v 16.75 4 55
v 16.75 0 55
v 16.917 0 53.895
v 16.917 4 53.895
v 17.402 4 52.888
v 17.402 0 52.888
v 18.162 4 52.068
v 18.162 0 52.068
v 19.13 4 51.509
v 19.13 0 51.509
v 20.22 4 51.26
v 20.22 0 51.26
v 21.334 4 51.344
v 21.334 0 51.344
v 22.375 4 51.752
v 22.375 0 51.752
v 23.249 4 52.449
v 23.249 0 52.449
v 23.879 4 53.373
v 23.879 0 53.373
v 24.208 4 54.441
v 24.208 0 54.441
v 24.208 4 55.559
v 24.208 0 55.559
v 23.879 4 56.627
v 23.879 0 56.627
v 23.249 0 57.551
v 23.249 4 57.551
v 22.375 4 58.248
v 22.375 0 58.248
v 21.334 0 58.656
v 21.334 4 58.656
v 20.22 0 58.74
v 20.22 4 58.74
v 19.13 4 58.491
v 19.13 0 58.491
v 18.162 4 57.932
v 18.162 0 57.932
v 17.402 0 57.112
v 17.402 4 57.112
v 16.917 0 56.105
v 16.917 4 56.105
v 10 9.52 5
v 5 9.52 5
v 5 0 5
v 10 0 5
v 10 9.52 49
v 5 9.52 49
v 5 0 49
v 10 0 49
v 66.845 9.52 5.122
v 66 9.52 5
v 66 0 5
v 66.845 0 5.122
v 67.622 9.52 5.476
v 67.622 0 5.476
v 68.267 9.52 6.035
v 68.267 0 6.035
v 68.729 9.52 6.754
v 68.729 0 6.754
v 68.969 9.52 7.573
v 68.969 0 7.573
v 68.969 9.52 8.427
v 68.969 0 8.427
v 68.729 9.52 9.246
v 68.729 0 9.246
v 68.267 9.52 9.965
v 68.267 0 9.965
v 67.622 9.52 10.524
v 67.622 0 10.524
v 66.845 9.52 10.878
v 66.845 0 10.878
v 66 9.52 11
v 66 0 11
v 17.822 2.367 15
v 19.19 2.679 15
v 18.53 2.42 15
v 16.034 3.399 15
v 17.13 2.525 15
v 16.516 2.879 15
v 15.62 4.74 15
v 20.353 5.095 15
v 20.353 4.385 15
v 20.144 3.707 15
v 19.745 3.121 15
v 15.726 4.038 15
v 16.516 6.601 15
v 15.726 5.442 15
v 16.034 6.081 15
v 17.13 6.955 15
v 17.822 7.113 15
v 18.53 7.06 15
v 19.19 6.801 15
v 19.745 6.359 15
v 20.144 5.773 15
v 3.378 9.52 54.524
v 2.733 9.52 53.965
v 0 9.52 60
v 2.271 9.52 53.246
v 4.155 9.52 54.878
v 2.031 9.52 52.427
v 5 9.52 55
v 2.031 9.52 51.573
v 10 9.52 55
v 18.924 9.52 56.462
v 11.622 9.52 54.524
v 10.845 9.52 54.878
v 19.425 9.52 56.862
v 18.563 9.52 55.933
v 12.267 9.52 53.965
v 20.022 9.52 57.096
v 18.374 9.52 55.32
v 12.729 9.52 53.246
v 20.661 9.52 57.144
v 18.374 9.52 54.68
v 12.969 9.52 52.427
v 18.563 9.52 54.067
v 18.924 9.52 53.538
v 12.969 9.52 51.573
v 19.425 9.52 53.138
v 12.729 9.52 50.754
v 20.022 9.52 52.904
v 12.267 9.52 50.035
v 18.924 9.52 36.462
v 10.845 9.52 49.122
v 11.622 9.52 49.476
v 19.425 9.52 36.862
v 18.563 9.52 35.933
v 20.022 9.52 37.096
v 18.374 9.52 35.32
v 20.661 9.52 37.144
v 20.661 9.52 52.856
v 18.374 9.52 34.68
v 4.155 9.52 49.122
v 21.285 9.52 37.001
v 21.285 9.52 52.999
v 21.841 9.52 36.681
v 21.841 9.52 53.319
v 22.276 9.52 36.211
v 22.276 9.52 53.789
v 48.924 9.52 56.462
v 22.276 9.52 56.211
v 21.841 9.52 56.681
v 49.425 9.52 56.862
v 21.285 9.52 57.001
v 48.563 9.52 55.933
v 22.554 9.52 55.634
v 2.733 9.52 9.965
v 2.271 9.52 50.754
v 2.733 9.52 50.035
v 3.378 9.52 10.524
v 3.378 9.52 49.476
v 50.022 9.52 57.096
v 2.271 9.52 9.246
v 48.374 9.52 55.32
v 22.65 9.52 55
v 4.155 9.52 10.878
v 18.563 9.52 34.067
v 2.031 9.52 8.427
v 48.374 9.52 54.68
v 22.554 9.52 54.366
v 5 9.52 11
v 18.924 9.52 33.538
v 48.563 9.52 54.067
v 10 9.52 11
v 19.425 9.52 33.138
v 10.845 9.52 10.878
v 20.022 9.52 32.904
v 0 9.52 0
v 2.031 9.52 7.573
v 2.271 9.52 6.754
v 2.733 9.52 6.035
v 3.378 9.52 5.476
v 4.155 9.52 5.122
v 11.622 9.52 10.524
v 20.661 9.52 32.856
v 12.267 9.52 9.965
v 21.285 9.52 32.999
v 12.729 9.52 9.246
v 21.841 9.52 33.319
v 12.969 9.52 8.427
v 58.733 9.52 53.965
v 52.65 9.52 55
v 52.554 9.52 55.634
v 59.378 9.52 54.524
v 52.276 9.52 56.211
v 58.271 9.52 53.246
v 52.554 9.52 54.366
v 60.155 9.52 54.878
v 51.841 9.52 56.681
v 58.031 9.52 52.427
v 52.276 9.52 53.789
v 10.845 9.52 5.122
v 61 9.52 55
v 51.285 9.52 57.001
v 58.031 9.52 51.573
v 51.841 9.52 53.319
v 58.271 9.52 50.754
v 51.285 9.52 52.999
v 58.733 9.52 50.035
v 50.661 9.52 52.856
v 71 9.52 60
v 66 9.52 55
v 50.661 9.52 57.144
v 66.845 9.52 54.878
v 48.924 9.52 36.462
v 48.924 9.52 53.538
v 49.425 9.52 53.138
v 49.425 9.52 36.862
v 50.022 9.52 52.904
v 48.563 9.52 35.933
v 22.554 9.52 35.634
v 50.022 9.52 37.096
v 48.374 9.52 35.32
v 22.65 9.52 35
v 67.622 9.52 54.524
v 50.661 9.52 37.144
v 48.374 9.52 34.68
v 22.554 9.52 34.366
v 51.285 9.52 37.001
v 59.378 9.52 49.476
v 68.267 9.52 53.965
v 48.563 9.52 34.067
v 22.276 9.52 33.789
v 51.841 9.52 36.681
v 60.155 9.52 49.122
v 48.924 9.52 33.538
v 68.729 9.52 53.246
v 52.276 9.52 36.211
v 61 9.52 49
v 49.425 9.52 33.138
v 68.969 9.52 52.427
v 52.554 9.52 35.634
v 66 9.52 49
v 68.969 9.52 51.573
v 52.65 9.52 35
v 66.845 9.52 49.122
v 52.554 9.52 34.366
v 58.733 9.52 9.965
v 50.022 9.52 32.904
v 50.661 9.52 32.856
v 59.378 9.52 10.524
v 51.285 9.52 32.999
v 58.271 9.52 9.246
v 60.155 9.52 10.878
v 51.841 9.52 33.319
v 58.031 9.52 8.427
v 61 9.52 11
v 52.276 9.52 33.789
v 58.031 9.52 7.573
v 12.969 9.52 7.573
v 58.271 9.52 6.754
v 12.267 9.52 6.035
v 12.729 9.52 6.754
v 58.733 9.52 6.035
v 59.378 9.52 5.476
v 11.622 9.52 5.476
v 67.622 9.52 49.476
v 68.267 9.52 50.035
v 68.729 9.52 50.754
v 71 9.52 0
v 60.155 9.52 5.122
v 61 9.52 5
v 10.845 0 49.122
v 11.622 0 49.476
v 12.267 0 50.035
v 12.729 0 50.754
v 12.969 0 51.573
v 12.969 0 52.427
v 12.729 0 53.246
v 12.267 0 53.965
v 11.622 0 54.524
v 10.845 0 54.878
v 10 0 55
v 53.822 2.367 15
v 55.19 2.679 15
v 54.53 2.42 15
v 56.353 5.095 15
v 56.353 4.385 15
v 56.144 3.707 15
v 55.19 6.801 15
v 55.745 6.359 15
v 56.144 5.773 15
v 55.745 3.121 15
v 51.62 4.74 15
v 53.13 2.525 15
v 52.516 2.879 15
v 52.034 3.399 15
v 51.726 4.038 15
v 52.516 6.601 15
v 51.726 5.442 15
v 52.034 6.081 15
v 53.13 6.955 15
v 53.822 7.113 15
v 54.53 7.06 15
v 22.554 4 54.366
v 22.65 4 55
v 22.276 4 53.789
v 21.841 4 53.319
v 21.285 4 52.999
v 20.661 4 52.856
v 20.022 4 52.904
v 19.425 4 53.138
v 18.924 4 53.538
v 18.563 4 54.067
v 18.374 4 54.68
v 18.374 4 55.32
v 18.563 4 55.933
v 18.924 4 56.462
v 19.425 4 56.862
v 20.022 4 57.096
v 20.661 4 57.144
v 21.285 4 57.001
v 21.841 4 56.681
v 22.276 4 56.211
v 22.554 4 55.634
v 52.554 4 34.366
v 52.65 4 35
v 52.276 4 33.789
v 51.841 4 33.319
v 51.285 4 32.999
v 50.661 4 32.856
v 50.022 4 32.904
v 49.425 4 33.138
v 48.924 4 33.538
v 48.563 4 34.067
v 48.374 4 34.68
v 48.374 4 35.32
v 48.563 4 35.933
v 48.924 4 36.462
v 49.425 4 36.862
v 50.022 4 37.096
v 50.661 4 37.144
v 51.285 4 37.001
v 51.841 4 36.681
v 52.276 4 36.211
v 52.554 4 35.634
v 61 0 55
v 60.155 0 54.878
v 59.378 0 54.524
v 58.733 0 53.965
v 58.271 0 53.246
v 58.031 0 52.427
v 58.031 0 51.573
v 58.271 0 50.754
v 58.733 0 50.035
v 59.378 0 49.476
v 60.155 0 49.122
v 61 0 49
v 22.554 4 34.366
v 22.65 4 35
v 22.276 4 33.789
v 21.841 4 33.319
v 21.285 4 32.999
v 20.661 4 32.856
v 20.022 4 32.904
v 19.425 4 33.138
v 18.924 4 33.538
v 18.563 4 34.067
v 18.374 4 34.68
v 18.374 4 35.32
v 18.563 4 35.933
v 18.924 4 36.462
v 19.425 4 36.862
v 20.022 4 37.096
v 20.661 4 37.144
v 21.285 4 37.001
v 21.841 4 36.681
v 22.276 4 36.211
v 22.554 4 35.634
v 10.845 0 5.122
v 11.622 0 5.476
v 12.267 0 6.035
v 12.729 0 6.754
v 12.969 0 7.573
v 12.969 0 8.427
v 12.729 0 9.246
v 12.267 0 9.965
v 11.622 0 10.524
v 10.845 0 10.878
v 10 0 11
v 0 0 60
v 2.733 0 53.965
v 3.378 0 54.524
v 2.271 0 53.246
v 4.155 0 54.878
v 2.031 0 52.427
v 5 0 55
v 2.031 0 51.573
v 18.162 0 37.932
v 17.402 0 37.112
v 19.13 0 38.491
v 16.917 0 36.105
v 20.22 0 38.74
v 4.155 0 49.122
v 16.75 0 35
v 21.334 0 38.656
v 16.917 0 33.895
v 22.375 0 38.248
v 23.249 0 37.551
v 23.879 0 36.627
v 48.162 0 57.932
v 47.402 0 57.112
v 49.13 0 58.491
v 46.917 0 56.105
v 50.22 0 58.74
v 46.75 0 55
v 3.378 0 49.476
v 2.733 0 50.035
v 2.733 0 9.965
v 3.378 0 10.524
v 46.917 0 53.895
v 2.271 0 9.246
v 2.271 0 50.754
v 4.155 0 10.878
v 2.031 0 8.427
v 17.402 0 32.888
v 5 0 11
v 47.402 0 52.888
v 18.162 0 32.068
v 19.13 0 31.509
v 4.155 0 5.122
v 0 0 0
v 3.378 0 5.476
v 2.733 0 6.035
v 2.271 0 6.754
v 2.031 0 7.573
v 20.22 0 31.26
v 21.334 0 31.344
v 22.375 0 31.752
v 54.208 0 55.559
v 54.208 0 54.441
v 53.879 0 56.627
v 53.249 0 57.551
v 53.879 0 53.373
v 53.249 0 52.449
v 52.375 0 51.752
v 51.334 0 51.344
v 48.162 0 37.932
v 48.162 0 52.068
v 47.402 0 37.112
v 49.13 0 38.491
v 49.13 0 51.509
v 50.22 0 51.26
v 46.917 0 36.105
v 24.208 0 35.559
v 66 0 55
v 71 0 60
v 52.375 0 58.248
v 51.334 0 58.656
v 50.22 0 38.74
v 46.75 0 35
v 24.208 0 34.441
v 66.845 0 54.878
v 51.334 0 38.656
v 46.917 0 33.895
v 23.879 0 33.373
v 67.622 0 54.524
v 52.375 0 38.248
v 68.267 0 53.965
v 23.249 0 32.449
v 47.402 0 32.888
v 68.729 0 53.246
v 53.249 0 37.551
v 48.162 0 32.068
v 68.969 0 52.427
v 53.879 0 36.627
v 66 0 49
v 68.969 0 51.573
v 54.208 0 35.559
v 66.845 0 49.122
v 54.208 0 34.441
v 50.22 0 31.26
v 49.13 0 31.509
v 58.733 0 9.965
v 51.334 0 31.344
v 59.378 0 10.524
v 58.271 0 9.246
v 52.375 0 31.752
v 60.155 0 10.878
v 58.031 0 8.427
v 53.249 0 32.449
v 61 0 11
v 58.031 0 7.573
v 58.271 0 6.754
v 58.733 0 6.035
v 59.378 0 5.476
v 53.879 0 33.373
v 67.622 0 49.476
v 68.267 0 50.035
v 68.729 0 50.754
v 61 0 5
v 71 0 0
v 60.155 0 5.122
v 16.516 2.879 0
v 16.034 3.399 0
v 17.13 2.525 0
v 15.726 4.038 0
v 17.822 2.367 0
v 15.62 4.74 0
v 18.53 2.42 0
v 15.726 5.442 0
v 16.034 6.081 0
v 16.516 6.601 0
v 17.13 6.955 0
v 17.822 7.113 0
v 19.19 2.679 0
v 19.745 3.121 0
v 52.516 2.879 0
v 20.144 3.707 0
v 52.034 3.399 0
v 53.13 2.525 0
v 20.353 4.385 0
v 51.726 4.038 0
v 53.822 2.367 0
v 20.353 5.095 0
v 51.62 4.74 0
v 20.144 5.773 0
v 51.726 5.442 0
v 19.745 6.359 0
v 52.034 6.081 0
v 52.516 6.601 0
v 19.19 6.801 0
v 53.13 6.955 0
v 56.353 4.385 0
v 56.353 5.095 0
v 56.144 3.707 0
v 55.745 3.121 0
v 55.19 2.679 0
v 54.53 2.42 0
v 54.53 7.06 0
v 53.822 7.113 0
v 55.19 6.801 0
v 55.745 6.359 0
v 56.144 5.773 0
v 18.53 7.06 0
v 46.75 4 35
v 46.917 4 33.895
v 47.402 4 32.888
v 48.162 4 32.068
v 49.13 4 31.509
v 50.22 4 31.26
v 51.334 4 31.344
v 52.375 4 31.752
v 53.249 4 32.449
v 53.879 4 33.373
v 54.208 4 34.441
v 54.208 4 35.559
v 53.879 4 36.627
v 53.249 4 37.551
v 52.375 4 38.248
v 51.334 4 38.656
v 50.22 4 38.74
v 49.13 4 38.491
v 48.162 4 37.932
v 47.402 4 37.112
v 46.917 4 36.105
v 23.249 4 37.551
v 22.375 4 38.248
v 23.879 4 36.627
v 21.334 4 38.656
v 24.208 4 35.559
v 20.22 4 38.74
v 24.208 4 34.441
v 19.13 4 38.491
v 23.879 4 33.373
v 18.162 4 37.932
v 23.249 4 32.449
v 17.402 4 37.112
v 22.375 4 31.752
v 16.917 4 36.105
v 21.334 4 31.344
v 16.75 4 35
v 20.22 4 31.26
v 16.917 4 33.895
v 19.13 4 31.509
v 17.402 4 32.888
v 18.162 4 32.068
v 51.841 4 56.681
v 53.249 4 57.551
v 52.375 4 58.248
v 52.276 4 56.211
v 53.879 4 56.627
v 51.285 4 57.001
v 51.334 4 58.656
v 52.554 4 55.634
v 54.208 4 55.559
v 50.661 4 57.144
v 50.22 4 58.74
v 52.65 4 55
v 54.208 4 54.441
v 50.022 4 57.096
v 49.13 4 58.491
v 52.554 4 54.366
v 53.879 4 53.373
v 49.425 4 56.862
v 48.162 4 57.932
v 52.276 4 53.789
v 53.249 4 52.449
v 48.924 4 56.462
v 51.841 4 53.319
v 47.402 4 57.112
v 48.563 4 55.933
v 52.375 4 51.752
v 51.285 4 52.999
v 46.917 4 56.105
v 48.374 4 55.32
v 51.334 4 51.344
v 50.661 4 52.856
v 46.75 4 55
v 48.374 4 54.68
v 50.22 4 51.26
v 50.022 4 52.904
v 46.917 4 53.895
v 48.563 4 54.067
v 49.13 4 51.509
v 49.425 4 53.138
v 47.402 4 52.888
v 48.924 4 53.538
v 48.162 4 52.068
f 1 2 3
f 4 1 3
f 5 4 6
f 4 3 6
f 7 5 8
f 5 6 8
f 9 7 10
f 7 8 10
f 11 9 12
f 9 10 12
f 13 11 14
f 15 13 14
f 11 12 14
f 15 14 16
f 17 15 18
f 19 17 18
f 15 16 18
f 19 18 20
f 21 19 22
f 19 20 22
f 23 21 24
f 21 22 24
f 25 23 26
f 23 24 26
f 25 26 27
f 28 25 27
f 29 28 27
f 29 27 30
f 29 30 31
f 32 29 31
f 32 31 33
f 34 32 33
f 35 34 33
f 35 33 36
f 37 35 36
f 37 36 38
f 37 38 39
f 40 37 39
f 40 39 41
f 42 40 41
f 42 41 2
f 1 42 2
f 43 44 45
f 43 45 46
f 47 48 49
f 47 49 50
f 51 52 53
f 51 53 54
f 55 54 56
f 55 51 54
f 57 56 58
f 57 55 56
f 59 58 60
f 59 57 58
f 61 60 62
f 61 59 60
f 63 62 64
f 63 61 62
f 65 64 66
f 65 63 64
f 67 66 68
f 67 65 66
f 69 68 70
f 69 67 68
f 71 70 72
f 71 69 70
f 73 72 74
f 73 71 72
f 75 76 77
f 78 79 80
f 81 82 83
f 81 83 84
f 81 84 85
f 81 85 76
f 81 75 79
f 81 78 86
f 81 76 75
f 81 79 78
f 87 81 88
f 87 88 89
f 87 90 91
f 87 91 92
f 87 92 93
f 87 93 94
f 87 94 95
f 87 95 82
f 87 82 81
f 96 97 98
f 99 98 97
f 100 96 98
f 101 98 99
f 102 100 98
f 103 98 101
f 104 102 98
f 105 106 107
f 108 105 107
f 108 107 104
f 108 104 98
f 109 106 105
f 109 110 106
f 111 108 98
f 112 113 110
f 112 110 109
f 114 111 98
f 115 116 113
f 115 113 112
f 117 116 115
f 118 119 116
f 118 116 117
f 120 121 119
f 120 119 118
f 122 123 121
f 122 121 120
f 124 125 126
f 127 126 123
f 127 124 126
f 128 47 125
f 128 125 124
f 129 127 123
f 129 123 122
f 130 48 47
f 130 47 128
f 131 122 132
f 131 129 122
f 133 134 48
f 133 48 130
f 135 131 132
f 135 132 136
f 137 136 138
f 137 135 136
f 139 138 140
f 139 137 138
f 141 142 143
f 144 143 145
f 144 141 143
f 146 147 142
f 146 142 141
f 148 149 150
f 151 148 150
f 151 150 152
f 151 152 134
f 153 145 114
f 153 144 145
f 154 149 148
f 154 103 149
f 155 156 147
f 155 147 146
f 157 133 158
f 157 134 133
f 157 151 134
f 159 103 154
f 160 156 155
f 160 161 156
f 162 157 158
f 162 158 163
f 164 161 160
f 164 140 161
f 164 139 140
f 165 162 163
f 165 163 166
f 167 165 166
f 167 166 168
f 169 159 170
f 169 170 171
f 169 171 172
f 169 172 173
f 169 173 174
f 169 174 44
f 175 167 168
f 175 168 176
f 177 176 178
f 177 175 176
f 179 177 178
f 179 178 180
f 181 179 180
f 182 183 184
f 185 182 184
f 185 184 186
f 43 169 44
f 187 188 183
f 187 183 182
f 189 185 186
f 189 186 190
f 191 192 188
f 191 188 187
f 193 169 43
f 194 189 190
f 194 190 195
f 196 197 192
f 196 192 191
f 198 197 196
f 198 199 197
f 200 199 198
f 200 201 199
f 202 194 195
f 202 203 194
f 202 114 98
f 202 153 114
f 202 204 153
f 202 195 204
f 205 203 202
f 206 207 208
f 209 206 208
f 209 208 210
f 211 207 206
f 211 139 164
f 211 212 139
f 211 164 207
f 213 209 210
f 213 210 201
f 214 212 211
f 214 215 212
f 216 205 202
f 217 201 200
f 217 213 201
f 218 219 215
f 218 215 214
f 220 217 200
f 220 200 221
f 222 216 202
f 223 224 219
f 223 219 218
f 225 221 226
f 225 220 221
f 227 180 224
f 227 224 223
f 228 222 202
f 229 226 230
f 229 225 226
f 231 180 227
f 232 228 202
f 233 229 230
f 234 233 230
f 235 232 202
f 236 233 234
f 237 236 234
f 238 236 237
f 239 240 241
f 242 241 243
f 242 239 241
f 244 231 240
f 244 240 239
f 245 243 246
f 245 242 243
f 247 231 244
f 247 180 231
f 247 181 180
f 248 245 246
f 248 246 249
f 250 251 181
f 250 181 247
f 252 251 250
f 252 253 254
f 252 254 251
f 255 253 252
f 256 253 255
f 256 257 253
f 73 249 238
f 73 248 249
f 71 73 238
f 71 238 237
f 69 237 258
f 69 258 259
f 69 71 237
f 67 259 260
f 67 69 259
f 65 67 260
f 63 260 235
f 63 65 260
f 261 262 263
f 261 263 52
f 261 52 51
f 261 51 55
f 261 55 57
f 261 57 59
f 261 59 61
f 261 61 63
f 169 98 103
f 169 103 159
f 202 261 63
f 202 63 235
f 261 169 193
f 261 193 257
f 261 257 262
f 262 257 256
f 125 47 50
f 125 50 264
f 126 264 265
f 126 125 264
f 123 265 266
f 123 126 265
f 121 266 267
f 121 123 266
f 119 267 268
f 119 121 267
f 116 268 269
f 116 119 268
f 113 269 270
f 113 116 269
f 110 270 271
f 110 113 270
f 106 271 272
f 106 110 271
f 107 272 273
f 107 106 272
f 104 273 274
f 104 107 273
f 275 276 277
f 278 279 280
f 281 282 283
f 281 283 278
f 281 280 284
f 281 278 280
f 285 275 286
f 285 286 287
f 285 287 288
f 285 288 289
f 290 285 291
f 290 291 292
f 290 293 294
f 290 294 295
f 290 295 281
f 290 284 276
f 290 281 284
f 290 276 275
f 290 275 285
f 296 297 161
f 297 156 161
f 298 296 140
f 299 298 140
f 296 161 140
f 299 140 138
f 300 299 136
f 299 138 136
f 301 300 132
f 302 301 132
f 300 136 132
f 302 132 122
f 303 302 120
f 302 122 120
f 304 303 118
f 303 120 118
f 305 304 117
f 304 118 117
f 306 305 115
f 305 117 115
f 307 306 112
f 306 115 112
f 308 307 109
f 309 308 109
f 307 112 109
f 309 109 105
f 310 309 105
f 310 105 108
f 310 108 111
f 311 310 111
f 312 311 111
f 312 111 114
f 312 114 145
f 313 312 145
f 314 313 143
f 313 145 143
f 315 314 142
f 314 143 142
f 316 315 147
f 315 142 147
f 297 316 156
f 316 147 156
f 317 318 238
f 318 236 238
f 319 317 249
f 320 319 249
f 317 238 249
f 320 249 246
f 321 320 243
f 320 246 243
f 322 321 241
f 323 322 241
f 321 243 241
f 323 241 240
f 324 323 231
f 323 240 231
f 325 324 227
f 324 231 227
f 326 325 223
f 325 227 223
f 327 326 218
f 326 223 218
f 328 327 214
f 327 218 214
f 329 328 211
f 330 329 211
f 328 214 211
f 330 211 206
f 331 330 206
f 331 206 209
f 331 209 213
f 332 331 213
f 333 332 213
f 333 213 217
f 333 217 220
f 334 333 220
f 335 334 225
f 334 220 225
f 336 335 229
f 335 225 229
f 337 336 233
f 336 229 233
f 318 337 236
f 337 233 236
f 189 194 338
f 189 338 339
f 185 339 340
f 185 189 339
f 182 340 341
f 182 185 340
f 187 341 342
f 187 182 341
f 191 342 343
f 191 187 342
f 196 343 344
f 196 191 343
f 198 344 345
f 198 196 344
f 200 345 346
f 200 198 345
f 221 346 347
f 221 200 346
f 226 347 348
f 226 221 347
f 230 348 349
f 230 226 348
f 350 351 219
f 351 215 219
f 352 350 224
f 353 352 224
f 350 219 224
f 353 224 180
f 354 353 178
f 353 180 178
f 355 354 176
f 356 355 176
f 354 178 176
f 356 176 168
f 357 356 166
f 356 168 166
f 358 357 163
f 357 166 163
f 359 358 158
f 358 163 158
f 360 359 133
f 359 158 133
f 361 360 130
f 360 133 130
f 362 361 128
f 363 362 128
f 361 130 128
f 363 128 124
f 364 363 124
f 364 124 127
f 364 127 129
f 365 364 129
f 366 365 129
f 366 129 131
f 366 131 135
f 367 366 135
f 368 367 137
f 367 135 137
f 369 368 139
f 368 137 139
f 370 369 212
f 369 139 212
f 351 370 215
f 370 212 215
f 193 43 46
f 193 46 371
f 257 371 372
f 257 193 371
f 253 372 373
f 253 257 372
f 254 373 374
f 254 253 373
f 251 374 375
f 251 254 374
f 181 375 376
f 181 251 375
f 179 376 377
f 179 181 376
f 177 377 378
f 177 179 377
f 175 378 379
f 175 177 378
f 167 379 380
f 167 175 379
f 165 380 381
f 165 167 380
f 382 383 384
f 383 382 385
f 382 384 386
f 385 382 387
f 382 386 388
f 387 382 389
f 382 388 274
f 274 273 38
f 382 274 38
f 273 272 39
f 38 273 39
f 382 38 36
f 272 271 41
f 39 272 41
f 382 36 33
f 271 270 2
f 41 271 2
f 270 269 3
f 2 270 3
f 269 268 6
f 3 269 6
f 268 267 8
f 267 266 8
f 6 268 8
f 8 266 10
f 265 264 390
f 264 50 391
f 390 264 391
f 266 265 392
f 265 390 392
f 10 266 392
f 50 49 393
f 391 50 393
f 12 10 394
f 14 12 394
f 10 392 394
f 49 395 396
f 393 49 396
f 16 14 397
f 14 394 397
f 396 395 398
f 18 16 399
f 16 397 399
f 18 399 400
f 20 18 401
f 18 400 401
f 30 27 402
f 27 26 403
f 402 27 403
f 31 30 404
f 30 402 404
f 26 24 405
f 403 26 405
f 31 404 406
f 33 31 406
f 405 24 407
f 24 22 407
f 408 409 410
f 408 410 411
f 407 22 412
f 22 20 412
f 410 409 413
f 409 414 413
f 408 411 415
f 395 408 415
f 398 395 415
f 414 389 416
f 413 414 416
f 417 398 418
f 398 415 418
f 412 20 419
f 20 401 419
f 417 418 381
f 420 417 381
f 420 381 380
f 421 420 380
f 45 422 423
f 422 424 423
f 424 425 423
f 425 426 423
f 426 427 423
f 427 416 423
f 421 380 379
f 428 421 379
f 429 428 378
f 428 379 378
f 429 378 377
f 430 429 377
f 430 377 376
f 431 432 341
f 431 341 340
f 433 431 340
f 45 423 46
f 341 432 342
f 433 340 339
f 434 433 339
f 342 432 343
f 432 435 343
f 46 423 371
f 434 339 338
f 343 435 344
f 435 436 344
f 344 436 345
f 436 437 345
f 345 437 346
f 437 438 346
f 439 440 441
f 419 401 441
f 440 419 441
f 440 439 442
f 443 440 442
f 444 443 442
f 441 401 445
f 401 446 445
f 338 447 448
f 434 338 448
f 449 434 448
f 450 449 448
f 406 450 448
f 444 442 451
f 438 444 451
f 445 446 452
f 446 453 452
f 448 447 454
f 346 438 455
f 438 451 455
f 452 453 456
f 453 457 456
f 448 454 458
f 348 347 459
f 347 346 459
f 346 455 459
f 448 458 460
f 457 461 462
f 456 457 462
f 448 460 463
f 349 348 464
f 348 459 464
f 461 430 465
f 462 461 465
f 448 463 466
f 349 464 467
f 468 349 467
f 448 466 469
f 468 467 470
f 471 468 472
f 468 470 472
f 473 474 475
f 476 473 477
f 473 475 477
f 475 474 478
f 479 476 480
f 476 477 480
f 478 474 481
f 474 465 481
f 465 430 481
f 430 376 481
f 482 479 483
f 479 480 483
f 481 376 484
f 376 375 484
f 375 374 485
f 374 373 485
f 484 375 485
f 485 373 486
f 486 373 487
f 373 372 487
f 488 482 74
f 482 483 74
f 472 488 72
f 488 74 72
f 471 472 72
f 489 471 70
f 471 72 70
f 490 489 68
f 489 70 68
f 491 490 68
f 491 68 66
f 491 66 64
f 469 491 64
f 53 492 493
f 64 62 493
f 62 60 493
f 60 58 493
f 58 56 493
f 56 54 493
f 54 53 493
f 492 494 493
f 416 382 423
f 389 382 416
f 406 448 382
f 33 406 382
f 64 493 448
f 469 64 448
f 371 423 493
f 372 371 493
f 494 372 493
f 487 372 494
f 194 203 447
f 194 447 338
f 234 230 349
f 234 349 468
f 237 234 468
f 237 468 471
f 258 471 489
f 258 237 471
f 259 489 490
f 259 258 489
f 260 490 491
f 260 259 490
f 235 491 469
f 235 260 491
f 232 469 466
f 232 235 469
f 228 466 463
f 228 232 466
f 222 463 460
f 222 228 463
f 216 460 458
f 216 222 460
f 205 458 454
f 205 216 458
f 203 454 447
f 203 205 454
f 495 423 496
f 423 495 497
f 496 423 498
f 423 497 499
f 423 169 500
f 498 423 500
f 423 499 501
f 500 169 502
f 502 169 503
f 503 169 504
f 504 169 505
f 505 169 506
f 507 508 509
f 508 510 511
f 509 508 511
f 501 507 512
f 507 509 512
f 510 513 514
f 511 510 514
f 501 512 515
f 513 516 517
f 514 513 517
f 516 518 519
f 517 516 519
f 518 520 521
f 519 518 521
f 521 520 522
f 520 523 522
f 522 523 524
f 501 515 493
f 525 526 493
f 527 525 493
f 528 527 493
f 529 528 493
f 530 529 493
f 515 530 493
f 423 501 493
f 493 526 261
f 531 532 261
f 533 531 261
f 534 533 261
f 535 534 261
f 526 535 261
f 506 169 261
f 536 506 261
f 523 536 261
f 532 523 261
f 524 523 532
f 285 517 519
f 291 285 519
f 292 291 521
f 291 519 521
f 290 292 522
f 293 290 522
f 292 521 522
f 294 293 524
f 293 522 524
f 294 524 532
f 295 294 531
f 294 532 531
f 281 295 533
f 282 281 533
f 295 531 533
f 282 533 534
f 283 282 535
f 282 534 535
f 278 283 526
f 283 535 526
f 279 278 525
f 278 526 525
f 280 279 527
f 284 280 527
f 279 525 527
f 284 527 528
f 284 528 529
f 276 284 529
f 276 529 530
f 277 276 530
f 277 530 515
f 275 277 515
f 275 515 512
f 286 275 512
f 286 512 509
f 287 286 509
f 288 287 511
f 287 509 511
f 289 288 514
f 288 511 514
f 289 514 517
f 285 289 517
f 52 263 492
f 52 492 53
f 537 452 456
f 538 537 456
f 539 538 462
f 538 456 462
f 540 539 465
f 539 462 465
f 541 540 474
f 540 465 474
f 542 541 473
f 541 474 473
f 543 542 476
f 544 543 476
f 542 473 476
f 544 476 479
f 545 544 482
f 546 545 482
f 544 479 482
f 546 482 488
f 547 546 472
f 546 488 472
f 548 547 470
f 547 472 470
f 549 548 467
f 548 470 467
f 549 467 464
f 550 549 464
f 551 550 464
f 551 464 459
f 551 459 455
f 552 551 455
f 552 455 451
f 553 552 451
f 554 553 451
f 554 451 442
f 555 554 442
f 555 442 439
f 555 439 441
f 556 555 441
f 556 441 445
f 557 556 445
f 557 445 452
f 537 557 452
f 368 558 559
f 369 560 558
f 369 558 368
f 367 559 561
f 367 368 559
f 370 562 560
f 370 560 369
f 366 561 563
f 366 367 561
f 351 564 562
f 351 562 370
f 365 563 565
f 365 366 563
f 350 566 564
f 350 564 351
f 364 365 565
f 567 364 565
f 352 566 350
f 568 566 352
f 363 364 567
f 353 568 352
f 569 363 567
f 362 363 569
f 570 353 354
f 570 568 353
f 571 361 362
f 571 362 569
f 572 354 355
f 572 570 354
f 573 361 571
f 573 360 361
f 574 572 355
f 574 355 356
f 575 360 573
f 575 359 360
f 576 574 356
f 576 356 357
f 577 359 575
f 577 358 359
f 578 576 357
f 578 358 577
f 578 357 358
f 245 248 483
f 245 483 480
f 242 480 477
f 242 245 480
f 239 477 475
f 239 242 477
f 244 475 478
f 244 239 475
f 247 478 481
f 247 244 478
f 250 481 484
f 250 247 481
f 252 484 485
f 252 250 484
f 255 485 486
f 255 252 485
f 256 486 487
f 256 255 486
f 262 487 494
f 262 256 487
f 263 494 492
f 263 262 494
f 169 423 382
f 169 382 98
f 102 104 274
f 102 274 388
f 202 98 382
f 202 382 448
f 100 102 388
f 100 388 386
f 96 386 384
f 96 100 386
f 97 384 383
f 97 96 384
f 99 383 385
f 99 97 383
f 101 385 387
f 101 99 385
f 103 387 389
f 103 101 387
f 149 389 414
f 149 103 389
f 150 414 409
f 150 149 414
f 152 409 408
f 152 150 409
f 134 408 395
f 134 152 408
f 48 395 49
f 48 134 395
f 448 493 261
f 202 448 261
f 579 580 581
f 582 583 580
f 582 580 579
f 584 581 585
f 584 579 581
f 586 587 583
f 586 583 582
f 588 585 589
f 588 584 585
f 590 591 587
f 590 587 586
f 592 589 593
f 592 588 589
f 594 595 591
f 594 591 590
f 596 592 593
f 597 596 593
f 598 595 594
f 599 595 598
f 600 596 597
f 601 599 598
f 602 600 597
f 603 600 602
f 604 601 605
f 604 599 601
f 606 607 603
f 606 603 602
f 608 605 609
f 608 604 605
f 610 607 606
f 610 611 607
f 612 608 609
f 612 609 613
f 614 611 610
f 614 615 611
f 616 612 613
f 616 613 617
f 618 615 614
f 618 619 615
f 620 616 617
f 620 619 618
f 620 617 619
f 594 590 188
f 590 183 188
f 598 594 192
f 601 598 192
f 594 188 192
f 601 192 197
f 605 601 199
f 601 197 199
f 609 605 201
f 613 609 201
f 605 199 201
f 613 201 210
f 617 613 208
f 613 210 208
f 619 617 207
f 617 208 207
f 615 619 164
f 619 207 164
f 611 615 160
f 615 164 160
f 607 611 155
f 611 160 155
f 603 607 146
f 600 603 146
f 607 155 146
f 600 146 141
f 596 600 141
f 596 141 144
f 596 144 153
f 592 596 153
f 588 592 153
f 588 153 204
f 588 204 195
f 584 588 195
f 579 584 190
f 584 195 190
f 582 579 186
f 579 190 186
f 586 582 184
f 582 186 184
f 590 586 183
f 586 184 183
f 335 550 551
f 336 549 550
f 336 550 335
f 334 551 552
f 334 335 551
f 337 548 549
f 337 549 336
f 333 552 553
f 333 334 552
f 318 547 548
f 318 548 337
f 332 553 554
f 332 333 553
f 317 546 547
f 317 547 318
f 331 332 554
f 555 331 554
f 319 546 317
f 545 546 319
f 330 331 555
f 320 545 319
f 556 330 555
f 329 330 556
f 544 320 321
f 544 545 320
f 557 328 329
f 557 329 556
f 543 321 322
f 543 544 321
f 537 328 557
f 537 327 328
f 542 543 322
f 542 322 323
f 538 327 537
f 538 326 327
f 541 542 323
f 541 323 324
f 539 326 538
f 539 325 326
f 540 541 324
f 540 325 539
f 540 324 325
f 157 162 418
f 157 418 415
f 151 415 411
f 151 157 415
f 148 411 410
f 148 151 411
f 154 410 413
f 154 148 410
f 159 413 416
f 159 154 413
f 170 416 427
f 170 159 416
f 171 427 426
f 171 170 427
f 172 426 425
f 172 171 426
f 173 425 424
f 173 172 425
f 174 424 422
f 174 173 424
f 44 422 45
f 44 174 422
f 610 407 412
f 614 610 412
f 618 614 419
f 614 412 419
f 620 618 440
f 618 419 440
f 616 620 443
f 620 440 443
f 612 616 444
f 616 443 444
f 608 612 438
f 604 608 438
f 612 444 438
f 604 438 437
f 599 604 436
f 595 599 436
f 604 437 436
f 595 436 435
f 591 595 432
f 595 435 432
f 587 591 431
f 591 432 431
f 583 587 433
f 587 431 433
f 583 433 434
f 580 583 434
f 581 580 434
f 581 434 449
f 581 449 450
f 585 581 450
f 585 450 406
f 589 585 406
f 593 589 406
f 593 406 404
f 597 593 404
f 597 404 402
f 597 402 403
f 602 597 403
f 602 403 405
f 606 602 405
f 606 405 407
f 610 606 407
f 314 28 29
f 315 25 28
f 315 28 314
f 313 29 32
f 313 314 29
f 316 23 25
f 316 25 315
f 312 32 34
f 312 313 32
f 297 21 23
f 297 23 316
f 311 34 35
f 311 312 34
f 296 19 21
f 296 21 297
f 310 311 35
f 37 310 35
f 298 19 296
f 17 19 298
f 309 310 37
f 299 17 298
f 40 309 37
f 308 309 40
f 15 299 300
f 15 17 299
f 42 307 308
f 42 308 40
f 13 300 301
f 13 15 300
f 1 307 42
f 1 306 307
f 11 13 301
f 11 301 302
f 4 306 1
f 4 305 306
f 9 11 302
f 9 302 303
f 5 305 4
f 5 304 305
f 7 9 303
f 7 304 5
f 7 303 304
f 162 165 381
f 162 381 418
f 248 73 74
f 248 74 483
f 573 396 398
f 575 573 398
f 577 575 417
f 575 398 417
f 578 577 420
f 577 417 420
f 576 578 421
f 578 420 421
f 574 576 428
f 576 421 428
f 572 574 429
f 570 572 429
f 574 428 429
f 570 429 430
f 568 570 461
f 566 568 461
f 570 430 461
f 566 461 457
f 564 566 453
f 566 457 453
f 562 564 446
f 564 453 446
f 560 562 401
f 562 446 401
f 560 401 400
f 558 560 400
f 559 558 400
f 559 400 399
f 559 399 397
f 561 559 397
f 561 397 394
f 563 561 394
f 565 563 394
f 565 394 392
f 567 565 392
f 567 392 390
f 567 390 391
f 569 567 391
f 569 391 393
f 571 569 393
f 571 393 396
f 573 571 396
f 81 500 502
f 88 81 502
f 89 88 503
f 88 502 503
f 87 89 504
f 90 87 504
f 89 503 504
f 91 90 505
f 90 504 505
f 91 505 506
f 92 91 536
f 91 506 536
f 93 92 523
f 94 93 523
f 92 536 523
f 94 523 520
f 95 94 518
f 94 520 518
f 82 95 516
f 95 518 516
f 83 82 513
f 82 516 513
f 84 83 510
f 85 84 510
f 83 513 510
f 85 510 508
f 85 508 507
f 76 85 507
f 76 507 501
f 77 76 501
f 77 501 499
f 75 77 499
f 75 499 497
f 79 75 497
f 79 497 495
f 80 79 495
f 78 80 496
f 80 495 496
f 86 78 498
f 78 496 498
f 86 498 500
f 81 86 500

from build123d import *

# Parameters (mm, degrees)
CROQUIS2_W                                           = 71
CROQUIS2_H                                           = 9.52
SALIENTE_EXTRUIR1_DEPTH                              = 60
CROQUIS3_R                                           = 2.38
CORTAR_EXTRUIR1_DEPTH                                = 15
CORTAR_EXTRUIR2_REACH                                = 95.443
REFRENTADO_PARA_TORNILLO_TAP_N_CON_CABEZ_D           = 4.3
REFRENTADO_PARA_TORNILLO_TAP_N_CON_CABEZ_DEPTH       = 17
REFRENTADO_PARA_TORNILLO_TAP_N_CON_CABEZ_CBORE_D     = 7.5
REFRENTADO_PARA_TORNILLO_TAP_N_CON_CABEZ_CBORE_DEPTH = 4
REFRENTADO_PARA_TORNILLO_TAP_N_CON_CABEZ_TIP         = 1.291850331


with BuildPart() as part:
    # Croquis2 → Saliente-Extruir1 (new body)
    with BuildSketch(Plane.XY):
        with Locations((35.5, 4.76)):
            Rectangle(CROQUIS2_W, CROQUIS2_H)
    extrude(amount=SALIENTE_EXTRUIR1_DEPTH)

    # Croquis3 → Cortar-Extruir1 (cut)
    with BuildSketch(Plane(origin=(0, 0, 0), x_dir=(-1, 0, 0), z_dir=(0, 0, -1))):
        with Locations((-54, 4.74)):
            Circle(CROQUIS3_R)
        with Locations((-18, 4.74)):
            Circle(CROQUIS3_R)
    extrude(amount=-CORTAR_EXTRUIR1_DEPTH, mode=Mode.SUBTRACT)

    # Croquis4 → Cortar-Extruir2 (cut, up to next)
    with BuildSketch(Plane(origin=(0, 9.52, 0), x_dir=(1, 0, 0), z_dir=(0, 1, 0)), mode=Mode.PRIVATE) as cortar_extruir2_sk1:
        with BuildLine():
            Line((61, -5), (66, -5))
            ThreePointArc((66, -5), (69, -8), (66, -11))
            Line((66, -11), (61, -11))
            ThreePointArc((61, -11), (58, -8), (61, -5))
        make_face()
    cortar_extruir2_tool1 = extrude(cortar_extruir2_sk1.sketch, amount=-CORTAR_EXTRUIR2_REACH, mode=Mode.PRIVATE) & part.part
    # Croquis4 → Cortar-Extruir2 (cut, up to next)
    with BuildSketch(Plane(origin=(0, 9.52, 0), x_dir=(1, 0, 0), z_dir=(0, 1, 0)), mode=Mode.PRIVATE) as cortar_extruir2_sk2:
        with BuildLine():
            Line((61, -49), (66, -49))
            ThreePointArc((66, -49), (69, -52), (66, -55))
            Line((66, -55), (61, -55))
            ThreePointArc((61, -55), (58, -52), (61, -49))
        make_face()
    cortar_extruir2_tool2 = extrude(cortar_extruir2_sk2.sketch, amount=-CORTAR_EXTRUIR2_REACH, mode=Mode.PRIVATE) & part.part
    # Croquis4 → Cortar-Extruir2 (cut, up to next)
    with BuildSketch(Plane(origin=(0, 9.52, 0), x_dir=(1, 0, 0), z_dir=(0, 1, 0)), mode=Mode.PRIVATE) as cortar_extruir2_sk3:
        with BuildLine():
            Line((5, -5), (10, -5))
            ThreePointArc((10, -5), (13, -8), (10, -11))
            Line((10, -11), (5, -11))
            ThreePointArc((5, -11), (2, -8), (5, -5))
        make_face()
    cortar_extruir2_tool3 = extrude(cortar_extruir2_sk3.sketch, amount=-CORTAR_EXTRUIR2_REACH, mode=Mode.PRIVATE) & part.part
    # Croquis4 → Cortar-Extruir2 (cut, up to next)
    with BuildSketch(Plane(origin=(0, 9.52, 0), x_dir=(1, 0, 0), z_dir=(0, 1, 0)), mode=Mode.PRIVATE) as cortar_extruir2_sk4:
        with BuildLine():
            Line((5, -49), (10, -49))
            ThreePointArc((10, -49), (13, -52), (10, -55))
            Line((10, -55), (5, -55))
            ThreePointArc((5, -55), (2, -52), (5, -49))
        make_face()
    cortar_extruir2_tool4 = extrude(cortar_extruir2_sk4.sketch, amount=-CORTAR_EXTRUIR2_REACH, mode=Mode.PRIVATE) & part.part
    add(cortar_extruir2_tool1.solids().sort_by_distance((63.5, 9.52, 8))[0], mode=Mode.SUBTRACT)
    add(cortar_extruir2_tool2.solids().sort_by_distance((63.5, 9.52, 52))[0], mode=Mode.SUBTRACT)
    add(cortar_extruir2_tool3.solids().sort_by_distance((7.5, 9.52, 8))[0], mode=Mode.SUBTRACT)
    add(cortar_extruir2_tool4.solids().sort_by_distance((7.5, 9.52, 52))[0], mode=Mode.SUBTRACT)

    # Refrentado para tornillo tapón con cabeza de clavija de M41
    with Locations(Plane(origin=(0, 0, 0), x_dir=(-1, 0, 0), z_dir=(0, -1, 0))):
        with Locations((-50.5, -35), (-50.5, -55), (-20.5, -55), (-20.5, -35)):
            CounterBoreHole(REFRENTADO_PARA_TORNILLO_TAP_N_CON_CABEZ_D / 2, REFRENTADO_PARA_TORNILLO_TAP_N_CON_CABEZ_CBORE_D / 2, REFRENTADO_PARA_TORNILLO_TAP_N_CON_CABEZ_CBORE_DEPTH, depth=REFRENTADO_PARA_TORNILLO_TAP_N_CON_CABEZ_DEPTH)
            with Locations((0, 0, -(REFRENTADO_PARA_TORNILLO_TAP_N_CON_CABEZ_DEPTH + REFRENTADO_PARA_TORNILLO_TAP_N_CON_CABEZ_TIP / 2))):  # 118° drill point
                Cone(0, REFRENTADO_PARA_TORNILLO_TAP_N_CON_CABEZ_D / 2, REFRENTADO_PARA_TORNILLO_TAP_N_CON_CABEZ_TIP, mode=Mode.SUBTRACT)


solid = part.part
